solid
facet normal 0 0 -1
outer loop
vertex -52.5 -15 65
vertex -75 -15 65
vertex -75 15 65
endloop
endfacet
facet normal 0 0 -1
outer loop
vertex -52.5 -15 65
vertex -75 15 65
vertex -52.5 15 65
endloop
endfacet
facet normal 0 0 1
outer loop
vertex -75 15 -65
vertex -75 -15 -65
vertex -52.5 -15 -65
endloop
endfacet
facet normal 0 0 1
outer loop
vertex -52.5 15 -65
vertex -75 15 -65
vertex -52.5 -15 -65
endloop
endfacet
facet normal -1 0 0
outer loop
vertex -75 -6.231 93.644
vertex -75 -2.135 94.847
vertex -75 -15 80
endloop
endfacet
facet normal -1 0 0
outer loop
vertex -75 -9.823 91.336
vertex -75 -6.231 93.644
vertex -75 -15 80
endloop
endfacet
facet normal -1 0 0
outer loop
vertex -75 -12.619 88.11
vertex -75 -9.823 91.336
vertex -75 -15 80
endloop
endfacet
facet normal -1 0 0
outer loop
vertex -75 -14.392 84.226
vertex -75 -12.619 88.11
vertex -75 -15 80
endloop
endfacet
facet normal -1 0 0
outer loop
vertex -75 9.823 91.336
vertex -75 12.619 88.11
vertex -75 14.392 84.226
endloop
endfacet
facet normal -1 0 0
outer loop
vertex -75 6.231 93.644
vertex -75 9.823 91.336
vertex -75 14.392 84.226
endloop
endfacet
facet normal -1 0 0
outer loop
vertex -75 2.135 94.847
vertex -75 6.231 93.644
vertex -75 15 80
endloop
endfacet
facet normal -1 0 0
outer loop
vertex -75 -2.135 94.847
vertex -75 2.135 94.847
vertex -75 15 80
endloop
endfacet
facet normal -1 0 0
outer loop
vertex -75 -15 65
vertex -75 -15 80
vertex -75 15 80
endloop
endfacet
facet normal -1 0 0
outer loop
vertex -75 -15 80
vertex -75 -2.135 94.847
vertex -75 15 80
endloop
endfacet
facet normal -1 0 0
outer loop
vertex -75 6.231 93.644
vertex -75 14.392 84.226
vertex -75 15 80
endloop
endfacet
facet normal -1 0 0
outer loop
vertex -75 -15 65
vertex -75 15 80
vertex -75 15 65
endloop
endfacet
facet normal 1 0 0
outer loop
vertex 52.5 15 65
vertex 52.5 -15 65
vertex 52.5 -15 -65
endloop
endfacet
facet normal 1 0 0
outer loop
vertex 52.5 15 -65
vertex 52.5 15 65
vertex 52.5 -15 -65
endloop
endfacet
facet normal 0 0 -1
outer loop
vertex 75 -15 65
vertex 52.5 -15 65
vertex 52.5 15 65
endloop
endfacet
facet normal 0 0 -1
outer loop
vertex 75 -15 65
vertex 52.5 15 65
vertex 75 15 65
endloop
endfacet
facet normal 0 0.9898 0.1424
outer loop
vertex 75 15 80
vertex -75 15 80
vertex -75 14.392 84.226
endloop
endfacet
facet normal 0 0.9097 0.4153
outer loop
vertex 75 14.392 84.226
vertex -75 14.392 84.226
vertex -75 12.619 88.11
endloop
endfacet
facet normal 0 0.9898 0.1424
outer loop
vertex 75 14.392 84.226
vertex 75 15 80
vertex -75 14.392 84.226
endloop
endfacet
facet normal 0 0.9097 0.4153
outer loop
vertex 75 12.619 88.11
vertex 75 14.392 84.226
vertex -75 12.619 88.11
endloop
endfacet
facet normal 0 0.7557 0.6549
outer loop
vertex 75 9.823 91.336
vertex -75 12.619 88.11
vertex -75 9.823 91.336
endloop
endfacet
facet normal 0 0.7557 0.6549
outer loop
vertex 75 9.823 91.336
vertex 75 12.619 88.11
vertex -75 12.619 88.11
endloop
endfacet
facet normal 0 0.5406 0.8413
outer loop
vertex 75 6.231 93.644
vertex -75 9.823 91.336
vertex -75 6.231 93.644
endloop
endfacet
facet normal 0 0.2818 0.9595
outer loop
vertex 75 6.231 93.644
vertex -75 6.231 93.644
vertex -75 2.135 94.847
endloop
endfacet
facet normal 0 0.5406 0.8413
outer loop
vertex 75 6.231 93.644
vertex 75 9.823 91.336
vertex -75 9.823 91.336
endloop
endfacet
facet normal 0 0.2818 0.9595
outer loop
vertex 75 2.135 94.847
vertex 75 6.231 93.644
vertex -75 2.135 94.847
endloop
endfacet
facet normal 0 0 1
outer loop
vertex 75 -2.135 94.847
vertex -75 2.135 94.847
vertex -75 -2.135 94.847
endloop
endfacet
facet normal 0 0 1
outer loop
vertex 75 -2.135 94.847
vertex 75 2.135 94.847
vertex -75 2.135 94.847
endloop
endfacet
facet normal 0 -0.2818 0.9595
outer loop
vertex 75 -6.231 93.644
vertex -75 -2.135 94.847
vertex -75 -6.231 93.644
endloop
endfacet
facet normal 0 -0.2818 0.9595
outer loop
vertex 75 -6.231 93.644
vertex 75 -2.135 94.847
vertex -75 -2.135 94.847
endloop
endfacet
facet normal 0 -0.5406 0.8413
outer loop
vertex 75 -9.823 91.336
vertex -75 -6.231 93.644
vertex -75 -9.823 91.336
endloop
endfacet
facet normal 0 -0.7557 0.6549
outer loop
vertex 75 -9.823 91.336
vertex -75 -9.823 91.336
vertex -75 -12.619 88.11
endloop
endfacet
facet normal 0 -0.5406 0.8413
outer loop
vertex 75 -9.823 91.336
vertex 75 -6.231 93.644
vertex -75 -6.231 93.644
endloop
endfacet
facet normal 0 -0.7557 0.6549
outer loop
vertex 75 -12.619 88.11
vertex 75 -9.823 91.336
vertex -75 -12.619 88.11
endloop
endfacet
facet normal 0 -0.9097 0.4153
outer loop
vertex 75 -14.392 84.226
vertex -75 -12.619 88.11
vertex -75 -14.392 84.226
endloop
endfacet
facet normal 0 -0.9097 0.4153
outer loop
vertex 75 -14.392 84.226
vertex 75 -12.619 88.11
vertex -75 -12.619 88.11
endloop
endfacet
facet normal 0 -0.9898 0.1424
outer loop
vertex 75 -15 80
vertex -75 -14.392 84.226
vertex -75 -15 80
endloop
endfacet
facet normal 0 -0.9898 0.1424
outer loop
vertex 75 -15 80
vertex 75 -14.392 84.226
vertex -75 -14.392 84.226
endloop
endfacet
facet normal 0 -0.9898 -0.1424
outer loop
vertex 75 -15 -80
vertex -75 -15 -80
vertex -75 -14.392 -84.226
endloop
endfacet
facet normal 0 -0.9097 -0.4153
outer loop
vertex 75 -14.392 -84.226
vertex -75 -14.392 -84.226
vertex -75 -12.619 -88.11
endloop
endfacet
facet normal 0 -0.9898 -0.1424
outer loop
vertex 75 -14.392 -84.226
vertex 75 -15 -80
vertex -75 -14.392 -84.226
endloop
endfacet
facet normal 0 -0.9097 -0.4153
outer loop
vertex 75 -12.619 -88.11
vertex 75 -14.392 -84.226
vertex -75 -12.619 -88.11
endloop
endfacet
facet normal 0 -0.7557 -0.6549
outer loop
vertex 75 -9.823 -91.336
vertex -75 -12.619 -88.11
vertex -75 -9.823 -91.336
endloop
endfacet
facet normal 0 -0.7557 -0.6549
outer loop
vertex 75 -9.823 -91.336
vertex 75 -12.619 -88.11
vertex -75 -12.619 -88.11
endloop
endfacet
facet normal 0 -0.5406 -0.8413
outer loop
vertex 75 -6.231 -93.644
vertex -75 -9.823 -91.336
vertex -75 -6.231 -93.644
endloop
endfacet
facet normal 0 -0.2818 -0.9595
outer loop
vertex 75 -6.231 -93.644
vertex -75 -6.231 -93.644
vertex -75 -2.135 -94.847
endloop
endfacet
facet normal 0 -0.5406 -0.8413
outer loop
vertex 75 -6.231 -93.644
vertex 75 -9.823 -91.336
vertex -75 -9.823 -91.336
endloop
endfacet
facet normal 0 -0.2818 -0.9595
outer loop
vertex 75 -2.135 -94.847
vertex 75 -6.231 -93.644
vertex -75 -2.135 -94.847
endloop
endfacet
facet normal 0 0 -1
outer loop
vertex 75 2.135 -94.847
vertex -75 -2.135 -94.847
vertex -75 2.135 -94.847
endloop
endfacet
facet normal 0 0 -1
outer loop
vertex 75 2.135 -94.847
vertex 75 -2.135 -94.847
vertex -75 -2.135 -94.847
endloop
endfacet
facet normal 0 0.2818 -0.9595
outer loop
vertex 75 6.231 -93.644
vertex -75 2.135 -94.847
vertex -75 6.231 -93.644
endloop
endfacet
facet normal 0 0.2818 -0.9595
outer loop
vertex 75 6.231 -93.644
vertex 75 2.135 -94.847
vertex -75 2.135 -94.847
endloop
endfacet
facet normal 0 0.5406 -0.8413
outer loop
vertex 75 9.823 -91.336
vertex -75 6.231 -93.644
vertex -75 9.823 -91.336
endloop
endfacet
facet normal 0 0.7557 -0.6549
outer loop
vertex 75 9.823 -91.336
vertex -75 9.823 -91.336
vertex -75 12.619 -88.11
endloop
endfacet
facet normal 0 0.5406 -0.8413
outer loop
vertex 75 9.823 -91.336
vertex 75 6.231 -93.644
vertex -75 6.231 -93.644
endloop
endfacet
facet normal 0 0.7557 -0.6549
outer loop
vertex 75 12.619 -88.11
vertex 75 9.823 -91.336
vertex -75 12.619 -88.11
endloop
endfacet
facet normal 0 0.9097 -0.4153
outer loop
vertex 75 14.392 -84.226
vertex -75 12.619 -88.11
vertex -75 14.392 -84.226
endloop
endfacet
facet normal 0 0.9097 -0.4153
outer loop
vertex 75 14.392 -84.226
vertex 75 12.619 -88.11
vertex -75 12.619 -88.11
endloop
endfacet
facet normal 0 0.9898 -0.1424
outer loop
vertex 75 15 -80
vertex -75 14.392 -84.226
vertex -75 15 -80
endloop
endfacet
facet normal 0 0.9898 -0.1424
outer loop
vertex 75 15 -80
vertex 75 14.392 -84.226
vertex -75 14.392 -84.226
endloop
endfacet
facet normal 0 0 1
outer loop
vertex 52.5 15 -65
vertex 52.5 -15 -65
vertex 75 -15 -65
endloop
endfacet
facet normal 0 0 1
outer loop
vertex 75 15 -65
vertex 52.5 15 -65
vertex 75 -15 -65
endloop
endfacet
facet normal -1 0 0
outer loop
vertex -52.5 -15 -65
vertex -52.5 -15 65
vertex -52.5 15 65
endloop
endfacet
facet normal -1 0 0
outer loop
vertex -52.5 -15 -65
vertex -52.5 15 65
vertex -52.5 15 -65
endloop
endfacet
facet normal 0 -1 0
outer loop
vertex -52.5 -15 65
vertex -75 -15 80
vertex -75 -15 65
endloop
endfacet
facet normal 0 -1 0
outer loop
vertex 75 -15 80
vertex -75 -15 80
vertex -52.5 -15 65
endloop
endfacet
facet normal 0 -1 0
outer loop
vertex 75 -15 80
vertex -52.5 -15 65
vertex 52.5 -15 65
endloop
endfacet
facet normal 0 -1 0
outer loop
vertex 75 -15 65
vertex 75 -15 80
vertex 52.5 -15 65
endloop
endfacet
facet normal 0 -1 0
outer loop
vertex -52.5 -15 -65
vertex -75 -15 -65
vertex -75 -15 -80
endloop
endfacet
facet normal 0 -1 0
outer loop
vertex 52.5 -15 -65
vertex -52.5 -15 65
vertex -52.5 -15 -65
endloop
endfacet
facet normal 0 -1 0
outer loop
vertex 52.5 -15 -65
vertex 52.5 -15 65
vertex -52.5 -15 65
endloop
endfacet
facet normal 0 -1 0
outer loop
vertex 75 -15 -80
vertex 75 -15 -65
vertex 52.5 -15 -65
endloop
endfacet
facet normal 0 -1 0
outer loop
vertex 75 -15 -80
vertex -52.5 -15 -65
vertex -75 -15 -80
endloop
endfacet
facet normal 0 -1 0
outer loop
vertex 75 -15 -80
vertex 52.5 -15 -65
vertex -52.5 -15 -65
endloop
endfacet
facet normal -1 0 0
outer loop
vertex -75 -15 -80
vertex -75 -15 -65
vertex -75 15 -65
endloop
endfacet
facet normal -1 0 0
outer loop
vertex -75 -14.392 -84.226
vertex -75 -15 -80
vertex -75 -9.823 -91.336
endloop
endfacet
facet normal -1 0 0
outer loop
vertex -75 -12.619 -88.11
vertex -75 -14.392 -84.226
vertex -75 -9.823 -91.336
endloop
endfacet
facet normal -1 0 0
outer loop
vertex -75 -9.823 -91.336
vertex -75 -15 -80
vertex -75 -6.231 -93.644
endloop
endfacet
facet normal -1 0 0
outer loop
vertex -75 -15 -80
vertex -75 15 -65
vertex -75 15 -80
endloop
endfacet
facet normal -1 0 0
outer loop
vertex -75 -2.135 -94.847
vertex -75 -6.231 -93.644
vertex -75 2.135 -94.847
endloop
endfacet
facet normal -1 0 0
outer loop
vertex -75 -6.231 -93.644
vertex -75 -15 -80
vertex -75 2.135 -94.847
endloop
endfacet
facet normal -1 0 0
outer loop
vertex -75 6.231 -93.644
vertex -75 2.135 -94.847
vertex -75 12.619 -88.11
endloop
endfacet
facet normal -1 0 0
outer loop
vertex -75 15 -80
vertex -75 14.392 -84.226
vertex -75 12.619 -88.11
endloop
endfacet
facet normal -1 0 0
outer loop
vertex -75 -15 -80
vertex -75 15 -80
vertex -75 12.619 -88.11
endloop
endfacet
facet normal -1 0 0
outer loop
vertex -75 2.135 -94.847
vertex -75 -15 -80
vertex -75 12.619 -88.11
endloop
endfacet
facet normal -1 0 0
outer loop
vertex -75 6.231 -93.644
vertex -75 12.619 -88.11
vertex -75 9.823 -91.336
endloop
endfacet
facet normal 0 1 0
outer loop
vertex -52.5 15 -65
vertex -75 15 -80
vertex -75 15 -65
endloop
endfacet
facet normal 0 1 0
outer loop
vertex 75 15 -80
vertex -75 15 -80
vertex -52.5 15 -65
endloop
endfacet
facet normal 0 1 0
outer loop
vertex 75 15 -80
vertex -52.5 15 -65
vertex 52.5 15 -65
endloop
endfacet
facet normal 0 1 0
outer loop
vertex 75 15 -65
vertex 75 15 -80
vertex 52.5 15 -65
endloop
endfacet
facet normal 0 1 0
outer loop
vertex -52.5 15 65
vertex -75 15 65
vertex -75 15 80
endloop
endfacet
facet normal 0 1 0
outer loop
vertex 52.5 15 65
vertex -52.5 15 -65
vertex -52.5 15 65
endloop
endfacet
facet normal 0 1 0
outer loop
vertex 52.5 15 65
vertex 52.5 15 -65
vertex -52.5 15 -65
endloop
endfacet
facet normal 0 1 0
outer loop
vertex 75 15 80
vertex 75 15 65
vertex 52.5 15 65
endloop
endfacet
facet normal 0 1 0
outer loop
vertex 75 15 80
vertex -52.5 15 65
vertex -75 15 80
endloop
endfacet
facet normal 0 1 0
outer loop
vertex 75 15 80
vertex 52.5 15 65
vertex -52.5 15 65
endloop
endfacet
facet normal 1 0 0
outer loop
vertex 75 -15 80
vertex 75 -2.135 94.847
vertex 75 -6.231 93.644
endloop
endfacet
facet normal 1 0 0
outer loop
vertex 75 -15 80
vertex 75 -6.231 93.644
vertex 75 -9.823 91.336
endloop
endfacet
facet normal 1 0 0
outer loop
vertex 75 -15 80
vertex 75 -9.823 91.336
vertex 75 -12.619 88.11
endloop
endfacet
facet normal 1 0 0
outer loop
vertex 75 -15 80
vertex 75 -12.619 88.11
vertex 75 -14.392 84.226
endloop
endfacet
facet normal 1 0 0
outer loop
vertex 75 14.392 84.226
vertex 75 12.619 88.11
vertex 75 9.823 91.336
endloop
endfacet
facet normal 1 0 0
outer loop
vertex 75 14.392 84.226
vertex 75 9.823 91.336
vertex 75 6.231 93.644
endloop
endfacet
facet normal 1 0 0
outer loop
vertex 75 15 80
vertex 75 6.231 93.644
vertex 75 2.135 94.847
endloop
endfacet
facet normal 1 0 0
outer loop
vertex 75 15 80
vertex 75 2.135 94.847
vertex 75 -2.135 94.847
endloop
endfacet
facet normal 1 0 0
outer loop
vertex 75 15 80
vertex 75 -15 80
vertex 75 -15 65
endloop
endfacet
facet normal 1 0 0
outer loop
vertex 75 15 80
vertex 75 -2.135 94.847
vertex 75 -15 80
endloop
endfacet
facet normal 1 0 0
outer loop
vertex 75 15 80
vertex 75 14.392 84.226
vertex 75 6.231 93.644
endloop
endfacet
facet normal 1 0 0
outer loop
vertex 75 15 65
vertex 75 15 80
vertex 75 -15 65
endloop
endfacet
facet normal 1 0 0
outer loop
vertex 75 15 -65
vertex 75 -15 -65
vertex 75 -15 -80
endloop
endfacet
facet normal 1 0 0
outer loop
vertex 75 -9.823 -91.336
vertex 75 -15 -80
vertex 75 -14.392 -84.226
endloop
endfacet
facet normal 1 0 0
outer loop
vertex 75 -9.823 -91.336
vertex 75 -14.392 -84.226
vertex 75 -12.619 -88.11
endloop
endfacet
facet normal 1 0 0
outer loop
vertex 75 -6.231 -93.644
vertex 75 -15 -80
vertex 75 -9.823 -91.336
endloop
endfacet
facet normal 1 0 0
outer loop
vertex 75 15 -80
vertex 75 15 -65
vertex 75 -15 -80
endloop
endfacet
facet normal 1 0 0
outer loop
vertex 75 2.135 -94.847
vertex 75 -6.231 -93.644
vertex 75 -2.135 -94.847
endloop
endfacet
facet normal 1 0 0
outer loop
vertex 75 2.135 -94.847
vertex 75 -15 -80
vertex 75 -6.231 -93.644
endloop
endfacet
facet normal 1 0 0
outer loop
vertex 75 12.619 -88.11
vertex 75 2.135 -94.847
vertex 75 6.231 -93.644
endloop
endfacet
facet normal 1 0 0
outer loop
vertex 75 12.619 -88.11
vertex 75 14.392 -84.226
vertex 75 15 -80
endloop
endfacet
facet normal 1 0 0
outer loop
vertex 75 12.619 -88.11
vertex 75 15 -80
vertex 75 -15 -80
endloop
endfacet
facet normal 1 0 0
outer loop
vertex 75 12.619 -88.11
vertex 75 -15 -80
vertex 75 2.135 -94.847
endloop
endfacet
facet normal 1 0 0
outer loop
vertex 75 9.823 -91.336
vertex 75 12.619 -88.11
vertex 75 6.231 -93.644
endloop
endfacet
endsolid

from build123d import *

# Parameters (mm, degrees)
AUFSATZ_LINEAR_AUSTRAGEN1_DEPTH = 75
SKIZZE5_OUTSIDE_W               = 200.786
SKIZZE5_OUTSIDE_H               = 240.786
SCHNITT_LINEAR_AUSTRAGEN5_DEPTH = 125.699639133


with BuildPart() as part:
    # Skizze1 → Aufsatz-Linear austragen1 (new, symmetric)
    with BuildSketch(Plane(origin=(0, 0, 0), x_dir=(0, 0, -1), z_dir=(1, 0, 0))):
        with BuildLine():
            Line((-80, -15), (80, -15))
            ThreePointArc((80, -15), (95, 0), (80, 15))
            Line((80, 15), (-80, 15))
            ThreePointArc((-80, 15), (-95, 0), (-80, -15))
        make_face()
    extrude(amount=AUFSATZ_LINEAR_AUSTRAGEN1_DEPTH, both=True)

    # Skizze5 outside → Schnitt-Linear austragen5 (cut, through all)
    with BuildSketch(Plane(origin=(0, 15, 0), x_dir=(1, 0, 0), z_dir=(0, 1, 0))):
        Rectangle(SKIZZE5_OUTSIDE_W, SKIZZE5_OUTSIDE_H)
        Polygon((75, 95), (-75, 95), (-75, 65), (-52.5, 65), (-52.5, -65), (-75, -65), (-75, -95), (75, -95), (75, -65), (52.5, -65), (52.5, 65), (75, 65), align=None, mode=Mode.SUBTRACT)
    extrude(amount=-SCHNITT_LINEAR_AUSTRAGEN5_DEPTH, mode=Mode.SUBTRACT)


solid = part.part
